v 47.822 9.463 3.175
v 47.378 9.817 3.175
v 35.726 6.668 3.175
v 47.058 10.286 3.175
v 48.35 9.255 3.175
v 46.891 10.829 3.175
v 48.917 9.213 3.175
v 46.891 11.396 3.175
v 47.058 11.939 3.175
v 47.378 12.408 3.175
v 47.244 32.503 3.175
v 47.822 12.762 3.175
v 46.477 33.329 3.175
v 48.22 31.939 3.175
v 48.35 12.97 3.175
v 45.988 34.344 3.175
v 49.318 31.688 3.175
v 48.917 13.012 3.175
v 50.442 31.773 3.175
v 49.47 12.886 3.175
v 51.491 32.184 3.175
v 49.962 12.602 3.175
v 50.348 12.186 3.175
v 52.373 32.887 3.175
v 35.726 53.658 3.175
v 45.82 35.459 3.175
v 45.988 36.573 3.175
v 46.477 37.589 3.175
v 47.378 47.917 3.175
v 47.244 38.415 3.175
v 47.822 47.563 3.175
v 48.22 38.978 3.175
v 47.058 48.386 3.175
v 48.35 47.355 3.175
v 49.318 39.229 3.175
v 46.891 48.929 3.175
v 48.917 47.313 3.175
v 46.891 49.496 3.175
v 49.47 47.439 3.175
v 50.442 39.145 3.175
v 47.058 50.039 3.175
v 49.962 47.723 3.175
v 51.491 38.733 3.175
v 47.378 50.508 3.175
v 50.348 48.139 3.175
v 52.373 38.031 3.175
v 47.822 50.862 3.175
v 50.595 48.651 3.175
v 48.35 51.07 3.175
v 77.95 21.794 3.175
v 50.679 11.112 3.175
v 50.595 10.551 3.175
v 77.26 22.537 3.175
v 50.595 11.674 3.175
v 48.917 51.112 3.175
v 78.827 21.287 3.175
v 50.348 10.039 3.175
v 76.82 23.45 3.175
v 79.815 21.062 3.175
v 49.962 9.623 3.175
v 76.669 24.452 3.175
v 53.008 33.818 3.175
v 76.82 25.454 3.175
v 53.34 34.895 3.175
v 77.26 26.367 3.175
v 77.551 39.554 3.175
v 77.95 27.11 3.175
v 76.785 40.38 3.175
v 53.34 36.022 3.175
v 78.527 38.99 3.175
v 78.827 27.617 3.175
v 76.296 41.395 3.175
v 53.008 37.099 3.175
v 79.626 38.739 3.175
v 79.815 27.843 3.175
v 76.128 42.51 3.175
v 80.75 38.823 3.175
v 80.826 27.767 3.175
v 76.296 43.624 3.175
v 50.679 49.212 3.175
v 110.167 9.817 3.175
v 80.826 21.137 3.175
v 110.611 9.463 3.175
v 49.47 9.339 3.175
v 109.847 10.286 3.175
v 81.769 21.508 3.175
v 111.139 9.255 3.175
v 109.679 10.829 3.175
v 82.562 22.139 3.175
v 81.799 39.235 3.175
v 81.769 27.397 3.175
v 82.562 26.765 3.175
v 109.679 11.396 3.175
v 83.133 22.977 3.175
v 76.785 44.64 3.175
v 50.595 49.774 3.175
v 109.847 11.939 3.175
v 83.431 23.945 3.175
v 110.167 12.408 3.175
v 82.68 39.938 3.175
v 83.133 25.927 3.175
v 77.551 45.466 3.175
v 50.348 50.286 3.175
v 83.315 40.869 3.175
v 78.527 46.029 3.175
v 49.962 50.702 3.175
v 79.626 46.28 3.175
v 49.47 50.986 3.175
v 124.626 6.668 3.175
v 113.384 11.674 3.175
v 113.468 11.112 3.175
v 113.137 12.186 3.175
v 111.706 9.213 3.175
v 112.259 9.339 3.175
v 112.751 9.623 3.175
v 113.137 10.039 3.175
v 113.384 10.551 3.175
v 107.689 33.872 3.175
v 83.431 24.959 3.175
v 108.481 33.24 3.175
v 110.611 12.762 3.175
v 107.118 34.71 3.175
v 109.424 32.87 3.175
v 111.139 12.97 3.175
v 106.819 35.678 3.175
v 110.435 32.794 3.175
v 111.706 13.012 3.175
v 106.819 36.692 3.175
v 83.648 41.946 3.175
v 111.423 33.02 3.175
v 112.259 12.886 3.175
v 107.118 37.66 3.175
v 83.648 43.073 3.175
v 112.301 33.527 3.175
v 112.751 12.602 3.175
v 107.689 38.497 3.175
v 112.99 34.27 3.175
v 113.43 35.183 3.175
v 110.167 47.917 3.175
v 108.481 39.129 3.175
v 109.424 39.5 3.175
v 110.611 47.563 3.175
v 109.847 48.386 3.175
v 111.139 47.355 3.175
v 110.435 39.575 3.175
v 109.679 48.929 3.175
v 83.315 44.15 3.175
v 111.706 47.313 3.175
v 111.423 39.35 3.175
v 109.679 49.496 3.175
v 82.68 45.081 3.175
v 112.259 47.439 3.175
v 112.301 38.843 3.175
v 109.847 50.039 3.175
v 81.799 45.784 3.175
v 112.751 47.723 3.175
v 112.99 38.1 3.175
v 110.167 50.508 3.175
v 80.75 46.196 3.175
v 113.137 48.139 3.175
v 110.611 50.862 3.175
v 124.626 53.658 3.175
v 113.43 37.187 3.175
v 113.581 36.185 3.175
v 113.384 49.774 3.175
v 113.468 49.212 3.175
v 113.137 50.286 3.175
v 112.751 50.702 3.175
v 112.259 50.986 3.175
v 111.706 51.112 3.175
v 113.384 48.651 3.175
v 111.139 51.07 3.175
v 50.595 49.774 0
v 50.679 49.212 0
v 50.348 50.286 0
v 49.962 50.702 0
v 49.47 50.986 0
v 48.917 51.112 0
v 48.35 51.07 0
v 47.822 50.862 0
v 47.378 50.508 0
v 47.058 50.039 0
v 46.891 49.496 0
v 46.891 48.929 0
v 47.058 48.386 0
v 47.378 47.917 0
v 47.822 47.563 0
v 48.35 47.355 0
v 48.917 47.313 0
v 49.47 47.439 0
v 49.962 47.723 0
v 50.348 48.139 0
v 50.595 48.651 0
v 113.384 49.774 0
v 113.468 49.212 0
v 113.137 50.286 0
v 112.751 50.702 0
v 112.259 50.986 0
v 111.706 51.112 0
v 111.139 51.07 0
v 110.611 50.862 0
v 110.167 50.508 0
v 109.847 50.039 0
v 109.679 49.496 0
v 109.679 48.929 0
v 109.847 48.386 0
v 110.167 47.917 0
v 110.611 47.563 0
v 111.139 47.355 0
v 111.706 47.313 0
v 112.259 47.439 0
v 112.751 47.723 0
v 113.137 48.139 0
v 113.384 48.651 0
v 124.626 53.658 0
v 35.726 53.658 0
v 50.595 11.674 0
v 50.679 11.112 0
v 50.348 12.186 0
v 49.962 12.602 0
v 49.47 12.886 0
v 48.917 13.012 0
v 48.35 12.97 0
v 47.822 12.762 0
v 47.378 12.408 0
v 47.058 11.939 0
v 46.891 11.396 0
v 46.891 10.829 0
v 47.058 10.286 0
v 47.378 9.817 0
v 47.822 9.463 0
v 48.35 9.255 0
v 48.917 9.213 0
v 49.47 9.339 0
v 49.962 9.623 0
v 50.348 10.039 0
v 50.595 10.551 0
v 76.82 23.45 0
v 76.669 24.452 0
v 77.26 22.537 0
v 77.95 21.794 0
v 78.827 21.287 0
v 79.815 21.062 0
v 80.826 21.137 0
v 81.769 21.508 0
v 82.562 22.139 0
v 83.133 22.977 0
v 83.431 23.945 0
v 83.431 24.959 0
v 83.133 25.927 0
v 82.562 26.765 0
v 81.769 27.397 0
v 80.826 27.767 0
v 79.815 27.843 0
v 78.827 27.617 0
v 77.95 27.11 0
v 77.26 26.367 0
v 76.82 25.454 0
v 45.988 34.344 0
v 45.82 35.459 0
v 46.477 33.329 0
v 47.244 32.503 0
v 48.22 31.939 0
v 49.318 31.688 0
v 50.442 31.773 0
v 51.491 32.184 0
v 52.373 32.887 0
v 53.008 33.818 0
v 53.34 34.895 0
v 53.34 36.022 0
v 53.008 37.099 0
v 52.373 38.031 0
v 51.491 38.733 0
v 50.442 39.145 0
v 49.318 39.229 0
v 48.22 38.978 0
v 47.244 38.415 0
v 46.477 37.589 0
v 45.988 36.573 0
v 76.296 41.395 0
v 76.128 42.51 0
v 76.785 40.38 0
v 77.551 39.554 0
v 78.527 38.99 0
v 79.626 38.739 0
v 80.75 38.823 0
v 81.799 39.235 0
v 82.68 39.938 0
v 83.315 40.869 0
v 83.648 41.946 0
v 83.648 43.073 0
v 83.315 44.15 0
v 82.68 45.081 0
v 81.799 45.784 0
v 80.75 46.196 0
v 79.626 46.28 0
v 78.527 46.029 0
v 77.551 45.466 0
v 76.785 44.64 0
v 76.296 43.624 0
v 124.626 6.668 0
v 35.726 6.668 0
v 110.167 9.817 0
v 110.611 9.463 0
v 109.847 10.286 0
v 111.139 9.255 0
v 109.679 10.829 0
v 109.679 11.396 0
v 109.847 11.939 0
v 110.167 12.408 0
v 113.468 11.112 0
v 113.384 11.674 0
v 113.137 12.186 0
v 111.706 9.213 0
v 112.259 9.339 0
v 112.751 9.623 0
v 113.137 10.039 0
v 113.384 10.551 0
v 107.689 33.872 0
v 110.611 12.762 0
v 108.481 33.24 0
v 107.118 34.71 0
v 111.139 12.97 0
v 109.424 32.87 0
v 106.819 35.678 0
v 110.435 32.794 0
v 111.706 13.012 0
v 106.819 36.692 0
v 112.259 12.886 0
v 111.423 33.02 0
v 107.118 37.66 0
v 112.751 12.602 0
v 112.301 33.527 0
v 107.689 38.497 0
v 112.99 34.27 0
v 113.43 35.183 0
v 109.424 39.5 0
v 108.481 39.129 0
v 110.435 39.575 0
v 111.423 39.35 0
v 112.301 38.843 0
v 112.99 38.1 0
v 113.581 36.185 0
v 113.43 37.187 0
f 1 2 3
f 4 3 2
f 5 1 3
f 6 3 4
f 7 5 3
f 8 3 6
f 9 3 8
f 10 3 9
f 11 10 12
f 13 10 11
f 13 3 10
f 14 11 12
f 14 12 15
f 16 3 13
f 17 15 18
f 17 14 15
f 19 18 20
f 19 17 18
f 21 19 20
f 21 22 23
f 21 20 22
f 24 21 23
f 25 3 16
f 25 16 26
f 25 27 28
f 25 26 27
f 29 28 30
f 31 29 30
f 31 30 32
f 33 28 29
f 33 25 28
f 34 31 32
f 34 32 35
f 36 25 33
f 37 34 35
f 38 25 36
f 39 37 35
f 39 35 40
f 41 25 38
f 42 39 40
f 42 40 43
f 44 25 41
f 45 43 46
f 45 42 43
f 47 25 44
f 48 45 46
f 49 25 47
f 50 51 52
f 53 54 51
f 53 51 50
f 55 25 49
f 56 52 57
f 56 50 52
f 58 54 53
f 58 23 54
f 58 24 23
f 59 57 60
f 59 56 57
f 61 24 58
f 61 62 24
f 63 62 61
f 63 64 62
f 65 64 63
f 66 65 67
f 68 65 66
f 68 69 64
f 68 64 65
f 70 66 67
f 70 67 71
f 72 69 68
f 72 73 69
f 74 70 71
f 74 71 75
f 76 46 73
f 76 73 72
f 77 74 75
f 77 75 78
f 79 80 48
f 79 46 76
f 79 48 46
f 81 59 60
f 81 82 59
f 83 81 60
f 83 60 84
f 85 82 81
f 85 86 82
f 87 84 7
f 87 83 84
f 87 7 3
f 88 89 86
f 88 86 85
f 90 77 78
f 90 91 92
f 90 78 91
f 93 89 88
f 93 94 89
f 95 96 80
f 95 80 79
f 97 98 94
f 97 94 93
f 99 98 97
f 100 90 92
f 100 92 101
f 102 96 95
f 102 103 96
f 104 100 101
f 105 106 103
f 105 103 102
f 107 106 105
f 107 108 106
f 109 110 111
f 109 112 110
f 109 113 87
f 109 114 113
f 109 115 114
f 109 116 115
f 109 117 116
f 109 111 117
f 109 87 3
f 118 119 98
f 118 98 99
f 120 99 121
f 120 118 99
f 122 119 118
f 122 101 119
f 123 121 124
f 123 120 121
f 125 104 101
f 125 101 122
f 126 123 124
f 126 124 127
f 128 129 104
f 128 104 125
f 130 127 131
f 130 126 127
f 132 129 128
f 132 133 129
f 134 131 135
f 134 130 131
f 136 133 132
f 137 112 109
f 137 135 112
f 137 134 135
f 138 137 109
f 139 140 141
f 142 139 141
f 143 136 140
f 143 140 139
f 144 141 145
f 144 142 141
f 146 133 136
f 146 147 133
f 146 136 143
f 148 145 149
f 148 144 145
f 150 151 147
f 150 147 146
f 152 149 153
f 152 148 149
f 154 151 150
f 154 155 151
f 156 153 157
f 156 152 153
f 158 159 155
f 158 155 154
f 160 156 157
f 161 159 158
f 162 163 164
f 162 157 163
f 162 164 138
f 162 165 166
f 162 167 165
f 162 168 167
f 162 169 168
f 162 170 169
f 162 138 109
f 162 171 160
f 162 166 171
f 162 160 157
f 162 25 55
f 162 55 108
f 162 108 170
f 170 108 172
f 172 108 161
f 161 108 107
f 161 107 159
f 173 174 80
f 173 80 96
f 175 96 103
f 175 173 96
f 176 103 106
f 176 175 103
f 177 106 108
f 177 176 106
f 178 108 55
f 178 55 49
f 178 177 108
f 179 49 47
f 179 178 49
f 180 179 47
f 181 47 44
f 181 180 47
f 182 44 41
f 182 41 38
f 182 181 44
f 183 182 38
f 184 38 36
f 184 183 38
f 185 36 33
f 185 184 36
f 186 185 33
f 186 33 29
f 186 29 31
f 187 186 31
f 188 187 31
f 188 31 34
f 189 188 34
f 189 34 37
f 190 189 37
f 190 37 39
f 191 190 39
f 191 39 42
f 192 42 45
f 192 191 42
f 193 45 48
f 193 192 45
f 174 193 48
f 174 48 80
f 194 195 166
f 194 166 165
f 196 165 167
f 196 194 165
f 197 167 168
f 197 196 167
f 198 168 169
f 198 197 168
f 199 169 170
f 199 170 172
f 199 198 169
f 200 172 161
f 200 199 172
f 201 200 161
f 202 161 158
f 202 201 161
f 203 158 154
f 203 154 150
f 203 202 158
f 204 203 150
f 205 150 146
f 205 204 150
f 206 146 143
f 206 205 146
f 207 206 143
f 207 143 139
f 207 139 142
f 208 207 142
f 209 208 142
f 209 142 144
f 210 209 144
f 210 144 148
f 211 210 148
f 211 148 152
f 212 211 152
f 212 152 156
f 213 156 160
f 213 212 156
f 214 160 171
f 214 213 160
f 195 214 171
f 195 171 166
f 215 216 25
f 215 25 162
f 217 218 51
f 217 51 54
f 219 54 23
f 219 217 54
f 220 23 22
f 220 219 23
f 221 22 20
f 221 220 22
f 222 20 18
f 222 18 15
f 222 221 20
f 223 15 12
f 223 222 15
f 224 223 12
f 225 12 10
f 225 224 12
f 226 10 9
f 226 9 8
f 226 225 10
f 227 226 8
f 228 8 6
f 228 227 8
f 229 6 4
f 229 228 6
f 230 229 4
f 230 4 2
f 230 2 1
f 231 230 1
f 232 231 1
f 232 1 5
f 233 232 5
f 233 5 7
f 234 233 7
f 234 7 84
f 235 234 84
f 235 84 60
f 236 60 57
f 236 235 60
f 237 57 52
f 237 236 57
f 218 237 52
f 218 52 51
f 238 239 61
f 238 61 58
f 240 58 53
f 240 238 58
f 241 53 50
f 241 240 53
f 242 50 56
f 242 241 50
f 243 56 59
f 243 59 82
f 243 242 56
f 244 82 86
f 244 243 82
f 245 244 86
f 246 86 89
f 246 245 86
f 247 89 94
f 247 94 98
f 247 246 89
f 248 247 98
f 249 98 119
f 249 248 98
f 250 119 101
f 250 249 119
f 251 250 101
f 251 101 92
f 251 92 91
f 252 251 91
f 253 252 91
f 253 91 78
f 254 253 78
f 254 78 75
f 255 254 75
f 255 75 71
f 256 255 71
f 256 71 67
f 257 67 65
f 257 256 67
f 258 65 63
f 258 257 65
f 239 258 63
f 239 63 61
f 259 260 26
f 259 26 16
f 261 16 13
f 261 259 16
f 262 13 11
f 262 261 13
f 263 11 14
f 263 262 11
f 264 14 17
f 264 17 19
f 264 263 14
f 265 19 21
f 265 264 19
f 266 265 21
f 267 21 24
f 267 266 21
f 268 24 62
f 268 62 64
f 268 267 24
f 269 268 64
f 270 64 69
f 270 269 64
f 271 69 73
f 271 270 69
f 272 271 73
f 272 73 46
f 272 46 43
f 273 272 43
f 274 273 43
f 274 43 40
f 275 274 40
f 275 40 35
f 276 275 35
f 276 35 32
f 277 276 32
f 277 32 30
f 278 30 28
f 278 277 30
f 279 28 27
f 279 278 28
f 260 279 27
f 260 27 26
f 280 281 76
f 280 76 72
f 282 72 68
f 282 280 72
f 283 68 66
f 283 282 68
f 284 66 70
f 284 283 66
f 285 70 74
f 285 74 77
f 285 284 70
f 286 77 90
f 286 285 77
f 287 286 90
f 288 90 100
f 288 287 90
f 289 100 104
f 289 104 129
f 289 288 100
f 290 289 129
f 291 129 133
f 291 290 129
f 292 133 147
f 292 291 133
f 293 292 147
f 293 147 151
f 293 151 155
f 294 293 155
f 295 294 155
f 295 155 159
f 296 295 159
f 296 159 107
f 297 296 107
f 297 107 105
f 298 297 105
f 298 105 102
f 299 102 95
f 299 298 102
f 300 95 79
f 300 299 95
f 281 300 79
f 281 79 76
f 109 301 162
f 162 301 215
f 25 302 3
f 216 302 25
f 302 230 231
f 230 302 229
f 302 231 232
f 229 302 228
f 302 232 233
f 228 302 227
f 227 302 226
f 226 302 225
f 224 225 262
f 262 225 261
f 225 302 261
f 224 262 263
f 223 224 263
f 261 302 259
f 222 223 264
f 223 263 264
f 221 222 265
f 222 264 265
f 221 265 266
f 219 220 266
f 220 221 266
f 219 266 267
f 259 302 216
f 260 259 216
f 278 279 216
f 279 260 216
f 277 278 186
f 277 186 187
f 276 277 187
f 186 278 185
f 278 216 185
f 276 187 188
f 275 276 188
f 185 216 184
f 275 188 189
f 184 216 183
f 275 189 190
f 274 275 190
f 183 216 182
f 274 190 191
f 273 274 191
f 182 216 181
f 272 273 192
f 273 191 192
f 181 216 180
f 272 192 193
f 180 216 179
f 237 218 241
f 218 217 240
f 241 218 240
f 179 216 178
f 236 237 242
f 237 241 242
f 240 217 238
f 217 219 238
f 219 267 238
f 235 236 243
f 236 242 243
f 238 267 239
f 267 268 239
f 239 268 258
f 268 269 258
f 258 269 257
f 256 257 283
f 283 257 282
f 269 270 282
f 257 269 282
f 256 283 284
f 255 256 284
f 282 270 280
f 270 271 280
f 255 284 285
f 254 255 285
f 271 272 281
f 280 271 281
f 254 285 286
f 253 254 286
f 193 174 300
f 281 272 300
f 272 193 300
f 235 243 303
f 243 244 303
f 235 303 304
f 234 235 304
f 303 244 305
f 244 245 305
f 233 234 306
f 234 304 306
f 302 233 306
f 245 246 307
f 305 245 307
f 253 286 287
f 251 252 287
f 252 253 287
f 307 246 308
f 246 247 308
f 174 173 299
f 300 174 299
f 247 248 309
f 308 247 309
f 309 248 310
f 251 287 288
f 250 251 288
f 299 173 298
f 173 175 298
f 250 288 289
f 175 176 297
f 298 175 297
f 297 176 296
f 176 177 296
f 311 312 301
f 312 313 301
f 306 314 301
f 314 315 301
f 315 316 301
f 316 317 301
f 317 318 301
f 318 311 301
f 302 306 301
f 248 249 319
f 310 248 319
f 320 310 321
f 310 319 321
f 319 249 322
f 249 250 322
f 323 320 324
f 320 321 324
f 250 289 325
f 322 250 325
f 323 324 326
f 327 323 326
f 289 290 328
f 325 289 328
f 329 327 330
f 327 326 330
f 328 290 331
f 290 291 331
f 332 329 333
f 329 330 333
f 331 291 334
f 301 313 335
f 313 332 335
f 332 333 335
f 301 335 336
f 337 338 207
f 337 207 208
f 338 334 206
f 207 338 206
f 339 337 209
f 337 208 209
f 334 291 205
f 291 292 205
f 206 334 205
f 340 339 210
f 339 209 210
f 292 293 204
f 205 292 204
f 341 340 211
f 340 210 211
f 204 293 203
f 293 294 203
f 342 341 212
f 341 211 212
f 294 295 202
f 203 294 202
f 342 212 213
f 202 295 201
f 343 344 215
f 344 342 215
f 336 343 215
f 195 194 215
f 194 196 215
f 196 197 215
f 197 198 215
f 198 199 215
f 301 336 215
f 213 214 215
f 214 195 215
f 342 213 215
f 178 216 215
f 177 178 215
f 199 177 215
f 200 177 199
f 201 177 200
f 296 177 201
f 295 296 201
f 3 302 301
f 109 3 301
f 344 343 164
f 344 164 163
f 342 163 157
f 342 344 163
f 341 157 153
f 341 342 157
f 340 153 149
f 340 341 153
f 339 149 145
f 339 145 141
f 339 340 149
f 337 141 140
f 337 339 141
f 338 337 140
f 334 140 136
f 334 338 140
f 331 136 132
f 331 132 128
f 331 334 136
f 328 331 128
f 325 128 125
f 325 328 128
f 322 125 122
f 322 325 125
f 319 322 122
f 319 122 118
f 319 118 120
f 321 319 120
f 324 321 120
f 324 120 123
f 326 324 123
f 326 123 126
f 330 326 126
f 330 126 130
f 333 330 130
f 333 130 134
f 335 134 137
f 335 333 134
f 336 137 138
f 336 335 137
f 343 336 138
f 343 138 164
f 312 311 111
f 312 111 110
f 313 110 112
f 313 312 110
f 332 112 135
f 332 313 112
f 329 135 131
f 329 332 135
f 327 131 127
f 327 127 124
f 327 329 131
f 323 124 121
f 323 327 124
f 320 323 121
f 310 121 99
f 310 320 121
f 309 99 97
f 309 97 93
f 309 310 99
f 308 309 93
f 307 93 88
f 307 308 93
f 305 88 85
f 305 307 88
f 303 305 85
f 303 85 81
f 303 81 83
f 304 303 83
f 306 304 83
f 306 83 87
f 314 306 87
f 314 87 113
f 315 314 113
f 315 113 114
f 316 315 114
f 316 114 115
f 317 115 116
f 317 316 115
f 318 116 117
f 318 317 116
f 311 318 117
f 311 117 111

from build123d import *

# Parameters (mm, degrees)
SKETCH1_W           = 88.9
SKETCH1_H           = 46.99
SKETCH1_R           = 1.905
BOSS_EXTRUDE1_DEPTH = 3.175


with BuildPart() as part:
    # Sketch1 → Boss-Extrude1 (new body)
    with BuildSketch(Plane.XY):
        with Locations((80.175941247, 30.1625)):
            Rectangle(SKETCH1_W, SKETCH1_H)
        with Locations((48.77435, 49.2125)):
            Circle(SKETCH1_R, mode=Mode.SUBTRACT)
        with Locations((111.56315, 49.2125)):
            Circle(SKETCH1_R, mode=Mode.SUBTRACT)
        with Locations((48.77435, 11.1125)):
            Circle(SKETCH1_R, mode=Mode.SUBTRACT)
        with Locations((111.56315, 11.1125)):
            Circle(SKETCH1_R, mode=Mode.SUBTRACT)
        with BuildLine():
            ThreePointArc((83.469406447, 24.4520759), (80.069406447, 27.8520759), (76.669406447, 24.4520759))
            ThreePointArc((76.669406447, 24.4520759), (80.069406447, 21.0520759), (83.469406447, 24.4520759))
        make_face(mode=Mode.SUBTRACT)
        with BuildLine():
            ThreePointArc((106.780920888, 36.184870981), (110.180920888, 32.784870981), (113.580920888, 36.184870981))
            ThreePointArc((113.580920888, 36.184870981), (110.180920888, 39.584870981), (106.780920888, 36.184870981))
        make_face(mode=Mode.SUBTRACT)
        with BuildLine():
            ThreePointArc((53.381968416, 35.458841184), (49.600968416, 39.239841184), (45.819968416, 35.458841184))
            ThreePointArc((45.819968416, 35.458841184), (49.600968416, 31.677841184), (53.381968416, 35.458841184))
        make_face(mode=Mode.SUBTRACT)
        with BuildLine():
            ThreePointArc((83.689808954, 42.509614322), (79.908808954, 46.290614322), (76.127808954, 42.509614322))
            ThreePointArc((76.127808954, 42.509614322), (79.908808954, 38.728614322), (83.689808954, 42.509614322))
        make_face(mode=Mode.SUBTRACT)
    extrude(amount=BOSS_EXTRUDE1_DEPTH)


solid = part.part
